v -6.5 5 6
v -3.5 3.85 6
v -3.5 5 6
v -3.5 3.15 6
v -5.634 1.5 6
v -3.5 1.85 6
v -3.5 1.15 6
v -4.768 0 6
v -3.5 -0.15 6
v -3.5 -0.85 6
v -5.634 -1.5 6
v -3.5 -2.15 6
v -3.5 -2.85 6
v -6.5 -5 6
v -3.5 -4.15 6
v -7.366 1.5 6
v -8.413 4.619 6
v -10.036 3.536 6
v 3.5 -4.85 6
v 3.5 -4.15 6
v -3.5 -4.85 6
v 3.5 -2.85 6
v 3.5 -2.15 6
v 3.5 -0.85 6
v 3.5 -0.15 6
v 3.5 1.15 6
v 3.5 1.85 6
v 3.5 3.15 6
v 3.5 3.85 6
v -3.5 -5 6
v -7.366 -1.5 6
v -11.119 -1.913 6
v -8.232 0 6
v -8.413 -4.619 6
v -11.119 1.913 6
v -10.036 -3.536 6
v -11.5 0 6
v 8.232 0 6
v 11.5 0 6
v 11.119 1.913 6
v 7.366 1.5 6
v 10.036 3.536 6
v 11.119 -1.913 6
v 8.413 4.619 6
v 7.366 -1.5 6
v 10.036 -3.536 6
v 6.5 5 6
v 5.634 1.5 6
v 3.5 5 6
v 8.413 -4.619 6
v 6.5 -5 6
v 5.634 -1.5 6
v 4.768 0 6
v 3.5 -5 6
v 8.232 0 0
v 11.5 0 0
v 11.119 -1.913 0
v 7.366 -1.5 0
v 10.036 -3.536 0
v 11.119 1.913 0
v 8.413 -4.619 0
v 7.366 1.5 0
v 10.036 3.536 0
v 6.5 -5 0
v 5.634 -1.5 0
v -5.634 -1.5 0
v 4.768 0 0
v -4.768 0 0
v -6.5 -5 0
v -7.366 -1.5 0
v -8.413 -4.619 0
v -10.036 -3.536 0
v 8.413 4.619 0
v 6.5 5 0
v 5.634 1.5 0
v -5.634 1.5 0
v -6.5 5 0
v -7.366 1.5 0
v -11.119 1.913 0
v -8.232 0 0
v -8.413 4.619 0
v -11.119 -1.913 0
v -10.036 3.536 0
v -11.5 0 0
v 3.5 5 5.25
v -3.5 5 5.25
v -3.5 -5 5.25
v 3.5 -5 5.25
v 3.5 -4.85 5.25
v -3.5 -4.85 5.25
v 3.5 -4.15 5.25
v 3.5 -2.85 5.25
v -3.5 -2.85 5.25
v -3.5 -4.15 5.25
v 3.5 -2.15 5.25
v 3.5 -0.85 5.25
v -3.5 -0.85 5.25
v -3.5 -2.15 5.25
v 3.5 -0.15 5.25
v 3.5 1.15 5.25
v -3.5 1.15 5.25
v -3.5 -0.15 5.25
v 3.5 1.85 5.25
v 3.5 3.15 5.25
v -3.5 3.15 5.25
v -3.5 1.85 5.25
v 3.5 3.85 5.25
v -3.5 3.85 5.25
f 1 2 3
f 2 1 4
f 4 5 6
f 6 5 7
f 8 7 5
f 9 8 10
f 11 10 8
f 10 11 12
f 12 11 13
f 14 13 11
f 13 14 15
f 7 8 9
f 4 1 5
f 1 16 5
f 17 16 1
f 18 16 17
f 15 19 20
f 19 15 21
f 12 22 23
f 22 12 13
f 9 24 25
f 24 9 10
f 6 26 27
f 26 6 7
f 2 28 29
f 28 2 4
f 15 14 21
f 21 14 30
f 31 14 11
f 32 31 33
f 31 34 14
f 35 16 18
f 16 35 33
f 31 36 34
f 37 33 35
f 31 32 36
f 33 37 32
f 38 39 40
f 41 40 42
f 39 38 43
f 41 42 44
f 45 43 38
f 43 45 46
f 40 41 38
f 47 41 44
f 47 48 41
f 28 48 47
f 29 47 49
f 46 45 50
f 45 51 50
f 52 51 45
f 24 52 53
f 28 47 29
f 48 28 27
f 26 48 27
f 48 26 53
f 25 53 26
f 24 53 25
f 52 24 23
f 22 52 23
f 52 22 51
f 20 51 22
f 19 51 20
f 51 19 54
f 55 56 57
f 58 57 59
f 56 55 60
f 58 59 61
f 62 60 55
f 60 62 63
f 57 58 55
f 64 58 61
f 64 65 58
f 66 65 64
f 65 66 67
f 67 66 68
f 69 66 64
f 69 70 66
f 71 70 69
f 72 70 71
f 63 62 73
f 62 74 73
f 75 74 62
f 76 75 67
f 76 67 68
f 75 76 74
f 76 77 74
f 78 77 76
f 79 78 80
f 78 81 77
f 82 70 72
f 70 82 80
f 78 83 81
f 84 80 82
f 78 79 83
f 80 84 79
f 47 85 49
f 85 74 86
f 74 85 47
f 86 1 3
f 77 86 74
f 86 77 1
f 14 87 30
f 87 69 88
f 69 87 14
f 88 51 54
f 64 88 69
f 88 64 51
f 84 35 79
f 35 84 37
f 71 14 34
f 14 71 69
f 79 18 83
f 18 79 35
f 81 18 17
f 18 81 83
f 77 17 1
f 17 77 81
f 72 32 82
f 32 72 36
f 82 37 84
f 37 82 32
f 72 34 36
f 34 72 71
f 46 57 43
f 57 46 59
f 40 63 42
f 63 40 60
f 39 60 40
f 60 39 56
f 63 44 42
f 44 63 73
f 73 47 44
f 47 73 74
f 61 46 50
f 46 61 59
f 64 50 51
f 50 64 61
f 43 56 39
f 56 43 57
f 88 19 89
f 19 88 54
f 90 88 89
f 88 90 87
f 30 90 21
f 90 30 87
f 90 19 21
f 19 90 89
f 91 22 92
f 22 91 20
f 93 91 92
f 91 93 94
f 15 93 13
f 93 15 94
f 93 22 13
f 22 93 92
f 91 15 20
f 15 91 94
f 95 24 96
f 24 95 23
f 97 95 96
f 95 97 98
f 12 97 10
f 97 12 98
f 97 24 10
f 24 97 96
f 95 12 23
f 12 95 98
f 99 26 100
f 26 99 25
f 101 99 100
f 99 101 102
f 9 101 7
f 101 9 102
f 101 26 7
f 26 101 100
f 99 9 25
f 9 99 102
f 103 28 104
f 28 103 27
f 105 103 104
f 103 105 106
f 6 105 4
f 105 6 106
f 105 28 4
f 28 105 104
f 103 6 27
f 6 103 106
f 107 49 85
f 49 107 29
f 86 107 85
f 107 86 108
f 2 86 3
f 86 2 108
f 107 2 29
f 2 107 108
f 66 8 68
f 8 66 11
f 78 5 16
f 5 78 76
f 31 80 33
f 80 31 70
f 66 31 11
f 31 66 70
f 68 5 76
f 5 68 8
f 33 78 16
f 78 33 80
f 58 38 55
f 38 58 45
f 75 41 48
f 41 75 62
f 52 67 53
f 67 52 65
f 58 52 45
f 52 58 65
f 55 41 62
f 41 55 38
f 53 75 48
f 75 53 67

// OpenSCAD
// file: functions.scad
// PRUSA Mendel  
// Functions used in many files
// GNU GPL v3
// Josef Průša
// josefprusa@me.com
// prusadjs.cz
// http://www.reprap.org/wiki/Prusa_Mendel
// http://github.com/prusajr/PrusaMendel


module nut(d,h,horizontal=true) {
	cornerdiameter = (d / 2) / cos (180 / 6);
	cylinder(h = h, r = cornerdiameter, $fn = 6);
	if(horizontal) {
		for(i = [1:6]) {
			rotate([0,0,60*i]) translate([-cornerdiameter-0.2,0,0]) rotate([0,0,-45]) cube(size = [2,2,h]);
		}
	}
}

// Based on nophead research
module polyhole(d,h) {
	n = max(round(2 * d),3);
	rotate([0,0,180])
		cylinder(h = h, r = (d / 2) / cos (180 / n), $fn = n);
}

module roundcorner(diameter) {
	difference() {
		cube(size = [diameter,diameter,99], center = false);
		translate(v = [diameter, diameter, 0]) cylinder(h = 100, r=diameter, center=true);
	}
}
// file: configuration.scad
// PRUSA Mendel  
// Configuration file
// GNU GPL v2
// Josef Pra
// josefprusa@me.com
// prusadjs.cz
// http://www.reprap.org/wiki/Prusa_Mendel
// http://github.com/prusajr/PrusaMendel


// PLEASE SELECT ONE OF THE CONFIGURATIONS BELOW
// BY UN-COMMENTING IT


variant=0; //0 for metric
//variant=1; //1 for SAE
if(variant==0){
echo("variant: metric");
}else if(variant==1){
echo("variant: sae");
} else{
echo("WARNING: INVALID CONFIGURATION");
}




vars=[
//[m8_dia,m8_nut, m4_dia, m4_nut, m3_dia, m3_nut, bush_dia, mot_shaft, bush_rod, bush_outerdia, bush_length, m5_dia, m5_nut]
[8.4, 14.8, 4.3,8.1, 5.1, 6.5, 11, 5.3, 8, 16, 11, 5.3,9.3],//metric - M3 nut was 7; M3 was 4.4
[9,15.7,5.5,10.6,5.5,10.6,11.5,5.3,7.9375,16,11,5.6, 10]//SAE
];


//BUSHING TYPE Can generate three versions
// 1 - regular old ones
// 2 - heliFPS54321%$#@!cal ones
// 3 - holders for brass or any other bought bushings
bushing_type = 2;


//Round corner diameter
round_corner_diameter = 8;


//Thin wall size
layer_height = 0.4;
perimeter_width_over_thicknes = 1.6;
infill_widht_over_thickness = 1.55;
thin_wall = 2*(perimeter_width_over_thicknes*layer_height+infill_widht_over_thickness*layer_height);
if(thin_wall<2){
	echo("Check thin wall size, its below 2mm!");
}
echo(thin_wall);


//DO NOT TOUCH THIS SECTION!
m8_diameter = vars[variant][0];
m8_nut_diameter = vars[variant][1];
m4_diameter = vars[variant][2];
m4_nut_diameter = vars[variant][3];
m3_diameter = vars[variant][4];
m3_nut_diameter = vars[variant][5];
bushing_diameter = vars[variant][6];
motor_shaft=vars[variant][7];
bushing_rodsize = vars[variant][8];
bushing_outerDiameter = vars[variant][9];
bushing_lenght = vars[variant][10];
m5_diameter = vars[variant][11];
m5_nut_diameter = vars[variant][12];



// MINI-HUXLEY VERSION (TODO, just place holder)
// include <configuration-huxley.scad>


// MEGA VERSION (TODO, just place holder)
// include <configuration-mega.scad>

// Gap between the X rods

x_rod_centres=70;
y_rod_centres=183;
belt_width=6;
belt_clamp_centres=18;
ptfe_diameter=4;
z_slot_width=3.5;

vertex_x_rod_1=[11.013,59.912];
vertex_x_rod_2=[40.274,9.249,0];
vertex_x_rod_gap=sqrt((vertex_x_rod_1.x-vertex_x_rod_2.x)*(vertex_x_rod_1.x-vertex_x_rod_2.x) +(vertex_x_rod_1.y-vertex_x_rod_2.y)*(vertex_x_rod_1.y-vertex_x_rod_2.y) );

// Some basic functions, probably should be somewhere else
module roundcorner(diameter){
	difference(){
		cube(size = [diameter,diameter,99], center = false);
		translate(v = [diameter, diameter, 0]) cylinder(h = 100, r=diameter, center=true);
	}
}

include <functions.scad>
// main file
// PRUSA Mendel  
// Belt clamp
// GNU GPL v3
// Josef Průša
// josefprusa@me.com
// prusadjs.cz
// http://www.reprap.org/wiki/Prusa_Mendel
// http://github.com/prusajr/PrusaMendel
//
// modified by neurofun

include <configuration.scad>


module beltclamp(){

clamp_height = 6;
clamp_width = 10;
clamp_length = 13;		// distance between the center of the 2 holes
belt_pitch = 2;
belt_width = 7;
tooth_width = 1.3;
tooth_heigth = .75;
offset = belt_pitch/4;
m3_diameter=3;
// uncomment next line for a symetric clamp
//offset = 0;

	difference(){
		// basic shape
		union(0){
			translate(v = [0,0,clamp_height/2]) cube([clamp_length,clamp_width,clamp_height], center=true);
			translate(v = [-clamp_length/2, 0, 0]) cylinder(r=clamp_width/2,h=clamp_height);
			translate(v = [clamp_length/2, 0, 0]) cylinder(r=clamp_width/2,h=clamp_height);
			}
		// screw holes
		translate(v = [-clamp_length/2, 0, -1])polyhole(m3_diameter, clamp_height+2);
		translate(v = [clamp_length/2, 0, -1]) polyhole(m3_diameter, clamp_height+2);
		// belt grip
		translate(v = [0,offset,clamp_height-tooth_heigth])
		for ( i = [round(-clamp_width/belt_pitch/2) : round(clamp_width/belt_pitch/2)]){
			translate(v = [0,belt_pitch*i,tooth_heigth])cube(size = [belt_width, tooth_width, tooth_heigth*2], center = true);
		}
	}

}
module polyhole(d,h) {
    n = max(round(2 * d),3);
    rotate([0,0,180])
        cylinder(h = h, r = (d / 2) / cos (180 / n), $fn = n);
}

beltclamp();
